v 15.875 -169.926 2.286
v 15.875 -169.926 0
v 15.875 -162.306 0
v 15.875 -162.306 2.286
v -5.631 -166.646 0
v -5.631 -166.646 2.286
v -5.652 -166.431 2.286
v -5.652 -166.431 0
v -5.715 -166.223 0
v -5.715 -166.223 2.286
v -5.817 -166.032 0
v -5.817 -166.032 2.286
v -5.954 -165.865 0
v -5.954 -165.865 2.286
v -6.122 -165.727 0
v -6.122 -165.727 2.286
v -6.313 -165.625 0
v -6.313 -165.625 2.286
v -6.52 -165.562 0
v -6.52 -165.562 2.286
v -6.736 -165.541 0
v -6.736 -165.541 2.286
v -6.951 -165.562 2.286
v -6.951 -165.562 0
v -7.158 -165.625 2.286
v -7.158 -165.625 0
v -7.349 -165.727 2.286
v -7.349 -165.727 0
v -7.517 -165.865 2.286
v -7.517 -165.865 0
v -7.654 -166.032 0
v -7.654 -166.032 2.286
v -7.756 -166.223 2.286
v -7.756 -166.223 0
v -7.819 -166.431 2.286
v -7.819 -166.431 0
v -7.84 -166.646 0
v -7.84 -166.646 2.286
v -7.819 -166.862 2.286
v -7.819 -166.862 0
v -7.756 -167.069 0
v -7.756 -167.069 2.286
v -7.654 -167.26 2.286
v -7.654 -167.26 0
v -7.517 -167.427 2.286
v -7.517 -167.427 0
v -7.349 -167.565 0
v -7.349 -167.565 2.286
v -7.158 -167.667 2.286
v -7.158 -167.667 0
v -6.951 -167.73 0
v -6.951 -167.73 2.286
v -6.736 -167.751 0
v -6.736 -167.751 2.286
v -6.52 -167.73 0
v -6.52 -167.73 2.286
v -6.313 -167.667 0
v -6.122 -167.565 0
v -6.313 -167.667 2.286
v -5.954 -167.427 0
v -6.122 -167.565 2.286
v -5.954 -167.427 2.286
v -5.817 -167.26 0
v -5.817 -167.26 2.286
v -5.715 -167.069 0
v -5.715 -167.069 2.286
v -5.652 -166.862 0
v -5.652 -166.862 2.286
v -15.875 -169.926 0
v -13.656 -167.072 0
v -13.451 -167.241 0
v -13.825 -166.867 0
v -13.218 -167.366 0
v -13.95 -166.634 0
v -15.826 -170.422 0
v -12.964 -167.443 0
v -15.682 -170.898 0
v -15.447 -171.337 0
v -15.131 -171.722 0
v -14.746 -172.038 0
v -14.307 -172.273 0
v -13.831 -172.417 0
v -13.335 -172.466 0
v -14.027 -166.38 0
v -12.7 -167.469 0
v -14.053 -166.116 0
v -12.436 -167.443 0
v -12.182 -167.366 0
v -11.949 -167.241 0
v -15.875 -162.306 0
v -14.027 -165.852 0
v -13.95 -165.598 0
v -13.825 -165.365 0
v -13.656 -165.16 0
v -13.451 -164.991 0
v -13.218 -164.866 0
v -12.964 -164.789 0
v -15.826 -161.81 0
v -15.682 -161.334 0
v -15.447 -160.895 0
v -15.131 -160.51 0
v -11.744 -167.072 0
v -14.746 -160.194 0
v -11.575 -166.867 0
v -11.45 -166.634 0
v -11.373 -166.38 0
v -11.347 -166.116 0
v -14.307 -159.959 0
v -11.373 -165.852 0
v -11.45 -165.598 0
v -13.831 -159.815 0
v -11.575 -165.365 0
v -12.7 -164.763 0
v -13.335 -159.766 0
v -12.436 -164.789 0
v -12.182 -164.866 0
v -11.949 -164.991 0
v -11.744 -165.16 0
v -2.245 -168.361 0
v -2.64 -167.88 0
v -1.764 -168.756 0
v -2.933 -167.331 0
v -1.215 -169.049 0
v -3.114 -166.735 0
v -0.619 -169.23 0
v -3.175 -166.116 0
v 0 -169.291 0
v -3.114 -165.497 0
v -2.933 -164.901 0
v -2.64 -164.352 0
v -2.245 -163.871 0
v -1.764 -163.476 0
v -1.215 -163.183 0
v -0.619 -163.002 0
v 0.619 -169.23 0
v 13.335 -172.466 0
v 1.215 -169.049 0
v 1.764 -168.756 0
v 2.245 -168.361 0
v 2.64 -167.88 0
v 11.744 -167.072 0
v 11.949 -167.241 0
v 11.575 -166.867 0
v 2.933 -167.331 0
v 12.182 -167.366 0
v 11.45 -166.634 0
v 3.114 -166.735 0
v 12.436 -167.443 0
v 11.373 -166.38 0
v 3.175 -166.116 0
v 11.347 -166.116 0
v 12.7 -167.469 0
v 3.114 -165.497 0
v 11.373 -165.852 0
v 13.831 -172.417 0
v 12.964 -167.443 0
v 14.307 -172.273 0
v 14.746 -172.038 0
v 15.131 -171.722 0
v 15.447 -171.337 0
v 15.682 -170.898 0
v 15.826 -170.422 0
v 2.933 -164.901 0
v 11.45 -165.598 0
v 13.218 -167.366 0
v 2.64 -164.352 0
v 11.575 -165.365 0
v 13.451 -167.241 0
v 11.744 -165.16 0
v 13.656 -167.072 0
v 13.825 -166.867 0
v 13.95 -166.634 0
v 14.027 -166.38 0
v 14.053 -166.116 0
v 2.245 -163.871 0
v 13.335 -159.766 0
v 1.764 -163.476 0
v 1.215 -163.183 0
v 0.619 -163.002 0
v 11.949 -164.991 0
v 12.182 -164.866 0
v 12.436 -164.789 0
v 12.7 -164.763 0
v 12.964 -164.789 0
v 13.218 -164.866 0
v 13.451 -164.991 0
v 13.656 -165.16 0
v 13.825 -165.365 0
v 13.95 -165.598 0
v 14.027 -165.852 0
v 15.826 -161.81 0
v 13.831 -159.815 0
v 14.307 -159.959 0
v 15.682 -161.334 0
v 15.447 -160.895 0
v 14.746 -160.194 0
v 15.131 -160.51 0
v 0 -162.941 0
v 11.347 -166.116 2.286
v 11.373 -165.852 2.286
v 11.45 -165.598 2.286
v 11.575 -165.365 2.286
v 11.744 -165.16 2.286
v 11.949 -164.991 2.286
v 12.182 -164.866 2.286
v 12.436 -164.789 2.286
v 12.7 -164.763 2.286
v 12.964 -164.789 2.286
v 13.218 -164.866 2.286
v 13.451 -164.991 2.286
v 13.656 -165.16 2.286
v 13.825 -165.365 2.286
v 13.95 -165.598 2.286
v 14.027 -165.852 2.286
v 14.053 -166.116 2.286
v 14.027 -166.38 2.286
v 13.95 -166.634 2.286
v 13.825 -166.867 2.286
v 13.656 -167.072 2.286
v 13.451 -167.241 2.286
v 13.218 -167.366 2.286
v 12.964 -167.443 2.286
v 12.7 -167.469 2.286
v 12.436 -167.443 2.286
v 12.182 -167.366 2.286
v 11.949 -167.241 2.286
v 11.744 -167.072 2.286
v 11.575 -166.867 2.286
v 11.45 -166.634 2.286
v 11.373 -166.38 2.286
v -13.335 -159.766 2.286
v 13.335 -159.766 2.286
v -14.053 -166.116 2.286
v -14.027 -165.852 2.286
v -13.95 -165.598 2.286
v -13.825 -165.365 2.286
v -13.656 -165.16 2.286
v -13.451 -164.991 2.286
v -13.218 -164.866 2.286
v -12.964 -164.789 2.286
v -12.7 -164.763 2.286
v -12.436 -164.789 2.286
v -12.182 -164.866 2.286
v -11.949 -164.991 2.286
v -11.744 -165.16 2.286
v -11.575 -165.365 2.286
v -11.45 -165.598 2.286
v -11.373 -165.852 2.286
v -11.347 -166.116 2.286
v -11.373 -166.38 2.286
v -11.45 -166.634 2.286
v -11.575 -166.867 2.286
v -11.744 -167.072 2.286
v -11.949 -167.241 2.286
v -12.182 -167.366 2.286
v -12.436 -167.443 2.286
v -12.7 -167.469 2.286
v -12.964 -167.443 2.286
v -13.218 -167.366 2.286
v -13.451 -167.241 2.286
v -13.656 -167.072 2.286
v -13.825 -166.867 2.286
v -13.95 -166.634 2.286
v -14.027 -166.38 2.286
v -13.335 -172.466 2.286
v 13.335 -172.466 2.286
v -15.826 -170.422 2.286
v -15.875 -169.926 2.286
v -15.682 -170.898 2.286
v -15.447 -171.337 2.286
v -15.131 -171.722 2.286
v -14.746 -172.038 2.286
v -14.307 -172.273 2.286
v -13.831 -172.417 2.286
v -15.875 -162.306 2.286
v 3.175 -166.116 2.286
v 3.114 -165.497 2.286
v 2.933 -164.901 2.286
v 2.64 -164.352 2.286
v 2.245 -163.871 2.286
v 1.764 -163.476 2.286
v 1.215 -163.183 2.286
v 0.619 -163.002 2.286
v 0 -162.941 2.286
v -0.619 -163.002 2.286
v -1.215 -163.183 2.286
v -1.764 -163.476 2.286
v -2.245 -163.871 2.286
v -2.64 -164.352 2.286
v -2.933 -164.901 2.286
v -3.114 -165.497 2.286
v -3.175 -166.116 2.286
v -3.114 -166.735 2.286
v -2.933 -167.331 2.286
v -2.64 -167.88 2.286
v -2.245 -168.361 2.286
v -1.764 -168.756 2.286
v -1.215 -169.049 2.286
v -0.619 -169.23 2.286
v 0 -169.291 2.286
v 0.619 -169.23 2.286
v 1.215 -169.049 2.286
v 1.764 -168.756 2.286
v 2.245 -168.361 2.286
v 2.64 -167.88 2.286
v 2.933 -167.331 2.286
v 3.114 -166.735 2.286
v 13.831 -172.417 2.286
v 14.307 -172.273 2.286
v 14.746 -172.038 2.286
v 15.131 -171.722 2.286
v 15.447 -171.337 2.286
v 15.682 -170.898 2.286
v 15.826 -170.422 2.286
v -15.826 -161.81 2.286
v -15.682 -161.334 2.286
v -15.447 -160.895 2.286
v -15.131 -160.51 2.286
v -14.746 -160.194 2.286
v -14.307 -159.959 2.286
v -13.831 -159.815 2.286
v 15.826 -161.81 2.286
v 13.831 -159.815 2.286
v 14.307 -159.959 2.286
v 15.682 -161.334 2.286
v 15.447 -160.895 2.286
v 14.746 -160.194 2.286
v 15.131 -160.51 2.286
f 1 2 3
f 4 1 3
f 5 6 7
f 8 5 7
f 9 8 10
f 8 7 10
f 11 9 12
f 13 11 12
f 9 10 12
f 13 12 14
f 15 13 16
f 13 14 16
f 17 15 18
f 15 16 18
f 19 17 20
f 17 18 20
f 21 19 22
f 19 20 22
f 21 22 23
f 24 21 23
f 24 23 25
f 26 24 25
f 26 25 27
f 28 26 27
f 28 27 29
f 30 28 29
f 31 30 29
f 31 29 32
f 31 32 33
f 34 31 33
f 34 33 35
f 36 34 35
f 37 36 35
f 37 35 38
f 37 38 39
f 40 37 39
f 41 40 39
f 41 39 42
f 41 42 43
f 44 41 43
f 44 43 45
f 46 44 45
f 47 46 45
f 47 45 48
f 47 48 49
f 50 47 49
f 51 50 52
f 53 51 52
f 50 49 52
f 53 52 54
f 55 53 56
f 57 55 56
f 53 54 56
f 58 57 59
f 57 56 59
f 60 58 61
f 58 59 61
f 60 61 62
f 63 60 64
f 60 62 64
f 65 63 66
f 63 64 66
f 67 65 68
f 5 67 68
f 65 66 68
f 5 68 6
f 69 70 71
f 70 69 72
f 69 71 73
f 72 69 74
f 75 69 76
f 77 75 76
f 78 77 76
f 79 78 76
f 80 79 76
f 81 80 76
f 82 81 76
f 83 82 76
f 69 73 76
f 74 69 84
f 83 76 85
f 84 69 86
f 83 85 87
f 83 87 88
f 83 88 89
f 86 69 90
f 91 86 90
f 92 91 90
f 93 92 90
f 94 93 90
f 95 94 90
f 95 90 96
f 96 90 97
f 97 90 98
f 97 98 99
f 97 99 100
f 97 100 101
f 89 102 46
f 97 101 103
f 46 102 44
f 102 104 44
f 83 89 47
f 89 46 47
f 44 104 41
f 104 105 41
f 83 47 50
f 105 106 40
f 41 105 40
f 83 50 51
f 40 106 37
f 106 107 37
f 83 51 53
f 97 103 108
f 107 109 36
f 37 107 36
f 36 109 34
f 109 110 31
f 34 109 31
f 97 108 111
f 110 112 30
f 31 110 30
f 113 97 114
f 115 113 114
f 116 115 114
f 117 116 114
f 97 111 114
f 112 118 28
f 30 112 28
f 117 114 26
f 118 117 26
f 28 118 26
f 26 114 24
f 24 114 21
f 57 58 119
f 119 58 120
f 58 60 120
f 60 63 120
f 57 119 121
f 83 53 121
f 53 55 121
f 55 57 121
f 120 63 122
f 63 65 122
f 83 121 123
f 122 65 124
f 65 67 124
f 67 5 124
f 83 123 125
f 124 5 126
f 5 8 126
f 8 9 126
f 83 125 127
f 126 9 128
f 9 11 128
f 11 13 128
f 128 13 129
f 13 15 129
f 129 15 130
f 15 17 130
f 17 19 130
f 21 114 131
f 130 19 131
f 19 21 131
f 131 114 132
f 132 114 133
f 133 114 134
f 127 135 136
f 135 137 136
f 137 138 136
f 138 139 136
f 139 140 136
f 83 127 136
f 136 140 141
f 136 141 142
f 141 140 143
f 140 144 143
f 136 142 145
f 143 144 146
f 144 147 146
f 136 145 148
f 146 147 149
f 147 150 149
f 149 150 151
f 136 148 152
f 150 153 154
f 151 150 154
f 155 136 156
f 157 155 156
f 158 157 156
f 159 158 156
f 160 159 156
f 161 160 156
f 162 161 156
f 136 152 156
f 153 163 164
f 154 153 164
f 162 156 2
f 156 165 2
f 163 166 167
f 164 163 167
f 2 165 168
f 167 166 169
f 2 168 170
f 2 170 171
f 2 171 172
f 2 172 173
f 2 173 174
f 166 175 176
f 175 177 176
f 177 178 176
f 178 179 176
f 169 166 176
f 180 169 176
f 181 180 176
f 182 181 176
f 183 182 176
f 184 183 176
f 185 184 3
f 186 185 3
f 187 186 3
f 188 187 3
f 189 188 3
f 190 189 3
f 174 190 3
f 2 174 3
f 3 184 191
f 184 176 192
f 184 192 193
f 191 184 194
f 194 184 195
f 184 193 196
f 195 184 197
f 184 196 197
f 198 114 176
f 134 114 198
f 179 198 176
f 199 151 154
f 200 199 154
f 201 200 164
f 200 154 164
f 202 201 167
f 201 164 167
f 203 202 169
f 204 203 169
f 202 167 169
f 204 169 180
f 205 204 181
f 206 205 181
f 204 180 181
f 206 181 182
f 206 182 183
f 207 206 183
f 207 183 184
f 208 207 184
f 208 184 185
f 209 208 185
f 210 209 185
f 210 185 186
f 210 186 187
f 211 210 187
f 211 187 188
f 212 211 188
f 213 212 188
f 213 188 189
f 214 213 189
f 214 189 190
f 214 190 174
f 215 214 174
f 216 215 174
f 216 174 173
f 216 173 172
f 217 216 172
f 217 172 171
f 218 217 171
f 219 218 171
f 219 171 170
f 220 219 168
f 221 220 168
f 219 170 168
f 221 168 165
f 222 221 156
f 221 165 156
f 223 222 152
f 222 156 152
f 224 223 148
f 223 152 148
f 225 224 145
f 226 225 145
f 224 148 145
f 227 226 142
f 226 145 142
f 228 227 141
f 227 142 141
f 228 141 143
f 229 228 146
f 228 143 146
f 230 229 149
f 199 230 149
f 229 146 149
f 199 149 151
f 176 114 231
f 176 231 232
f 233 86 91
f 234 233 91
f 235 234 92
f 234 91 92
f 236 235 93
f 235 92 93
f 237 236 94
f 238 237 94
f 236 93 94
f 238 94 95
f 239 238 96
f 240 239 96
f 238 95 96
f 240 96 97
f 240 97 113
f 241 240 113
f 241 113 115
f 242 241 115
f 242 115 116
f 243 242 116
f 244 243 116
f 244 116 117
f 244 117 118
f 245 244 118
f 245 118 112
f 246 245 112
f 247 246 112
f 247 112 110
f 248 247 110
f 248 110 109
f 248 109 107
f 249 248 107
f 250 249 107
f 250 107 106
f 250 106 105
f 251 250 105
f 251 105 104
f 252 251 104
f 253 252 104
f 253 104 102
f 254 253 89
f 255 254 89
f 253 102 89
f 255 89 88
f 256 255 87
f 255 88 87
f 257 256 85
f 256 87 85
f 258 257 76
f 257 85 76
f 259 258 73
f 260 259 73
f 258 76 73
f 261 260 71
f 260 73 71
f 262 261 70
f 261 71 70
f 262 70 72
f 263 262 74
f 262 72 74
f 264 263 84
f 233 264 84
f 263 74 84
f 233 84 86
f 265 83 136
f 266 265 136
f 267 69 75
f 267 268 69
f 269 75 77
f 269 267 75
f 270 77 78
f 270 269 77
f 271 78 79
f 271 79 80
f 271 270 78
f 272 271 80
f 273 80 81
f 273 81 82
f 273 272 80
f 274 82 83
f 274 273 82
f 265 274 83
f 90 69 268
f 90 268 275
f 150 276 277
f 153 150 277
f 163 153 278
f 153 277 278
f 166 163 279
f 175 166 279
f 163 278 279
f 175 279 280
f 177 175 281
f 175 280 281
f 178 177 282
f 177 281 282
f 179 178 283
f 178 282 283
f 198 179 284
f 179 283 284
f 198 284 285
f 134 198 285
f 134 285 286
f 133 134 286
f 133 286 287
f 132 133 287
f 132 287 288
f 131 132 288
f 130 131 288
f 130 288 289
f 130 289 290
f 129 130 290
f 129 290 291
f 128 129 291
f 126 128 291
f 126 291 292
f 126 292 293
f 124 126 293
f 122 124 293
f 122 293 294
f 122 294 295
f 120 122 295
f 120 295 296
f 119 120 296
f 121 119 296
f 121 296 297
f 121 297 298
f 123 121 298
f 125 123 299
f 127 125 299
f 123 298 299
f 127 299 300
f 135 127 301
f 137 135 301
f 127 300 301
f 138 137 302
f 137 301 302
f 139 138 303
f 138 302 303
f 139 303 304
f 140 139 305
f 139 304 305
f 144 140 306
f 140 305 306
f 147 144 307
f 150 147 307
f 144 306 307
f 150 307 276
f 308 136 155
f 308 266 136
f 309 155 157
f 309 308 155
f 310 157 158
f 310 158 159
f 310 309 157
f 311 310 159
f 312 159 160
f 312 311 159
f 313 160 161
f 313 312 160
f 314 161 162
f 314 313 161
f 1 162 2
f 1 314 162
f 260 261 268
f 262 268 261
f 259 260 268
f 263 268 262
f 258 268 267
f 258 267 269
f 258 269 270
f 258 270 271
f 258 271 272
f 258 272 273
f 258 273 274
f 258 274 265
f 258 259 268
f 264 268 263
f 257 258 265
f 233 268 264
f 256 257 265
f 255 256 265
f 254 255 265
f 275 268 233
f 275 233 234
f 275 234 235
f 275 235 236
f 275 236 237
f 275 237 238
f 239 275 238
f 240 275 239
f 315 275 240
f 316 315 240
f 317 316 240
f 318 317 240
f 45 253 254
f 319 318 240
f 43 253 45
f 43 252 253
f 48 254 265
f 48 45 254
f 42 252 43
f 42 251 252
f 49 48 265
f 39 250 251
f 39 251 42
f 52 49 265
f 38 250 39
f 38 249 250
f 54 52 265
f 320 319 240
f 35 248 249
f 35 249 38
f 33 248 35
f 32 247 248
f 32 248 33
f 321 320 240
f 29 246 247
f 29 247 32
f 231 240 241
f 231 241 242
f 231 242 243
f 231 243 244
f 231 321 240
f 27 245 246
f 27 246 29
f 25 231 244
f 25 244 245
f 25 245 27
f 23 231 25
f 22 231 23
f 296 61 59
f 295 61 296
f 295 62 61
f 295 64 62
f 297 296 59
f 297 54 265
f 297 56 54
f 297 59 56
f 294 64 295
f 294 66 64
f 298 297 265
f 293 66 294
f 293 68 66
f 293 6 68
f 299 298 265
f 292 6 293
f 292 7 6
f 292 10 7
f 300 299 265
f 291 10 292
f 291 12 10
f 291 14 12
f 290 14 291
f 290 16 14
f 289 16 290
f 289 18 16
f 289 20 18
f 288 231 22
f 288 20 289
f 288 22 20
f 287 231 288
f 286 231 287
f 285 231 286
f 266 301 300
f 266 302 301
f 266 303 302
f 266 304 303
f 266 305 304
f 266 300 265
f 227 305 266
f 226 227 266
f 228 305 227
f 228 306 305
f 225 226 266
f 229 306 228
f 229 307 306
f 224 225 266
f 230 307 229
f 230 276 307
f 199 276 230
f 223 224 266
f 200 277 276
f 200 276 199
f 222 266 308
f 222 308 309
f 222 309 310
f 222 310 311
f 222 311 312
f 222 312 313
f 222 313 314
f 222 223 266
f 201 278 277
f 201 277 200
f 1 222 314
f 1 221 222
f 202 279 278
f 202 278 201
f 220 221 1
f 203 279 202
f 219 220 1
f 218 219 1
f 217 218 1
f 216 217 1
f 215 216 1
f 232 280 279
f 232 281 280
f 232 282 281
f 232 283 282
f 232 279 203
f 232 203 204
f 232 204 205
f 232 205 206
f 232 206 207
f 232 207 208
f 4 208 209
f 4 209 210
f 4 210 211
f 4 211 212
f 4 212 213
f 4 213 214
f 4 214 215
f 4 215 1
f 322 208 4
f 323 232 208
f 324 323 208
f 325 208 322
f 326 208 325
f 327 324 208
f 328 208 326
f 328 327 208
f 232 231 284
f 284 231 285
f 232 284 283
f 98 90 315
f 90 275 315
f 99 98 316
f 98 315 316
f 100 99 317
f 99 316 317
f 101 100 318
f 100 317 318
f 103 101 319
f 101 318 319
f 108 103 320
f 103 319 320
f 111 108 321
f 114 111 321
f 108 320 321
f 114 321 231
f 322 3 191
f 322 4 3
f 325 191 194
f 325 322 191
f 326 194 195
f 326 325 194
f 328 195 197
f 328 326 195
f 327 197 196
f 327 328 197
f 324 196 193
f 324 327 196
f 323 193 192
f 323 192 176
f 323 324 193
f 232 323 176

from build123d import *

# Parameters (mm, degrees)
SKETCH1_W             = 31.75
SKETCH1_H             = 12.7
BOSS_EXTRUDE1_DEPTH   = 2.286
FILLET1_R             = 2.54
SKETCH2_R             = 3.175
SKETCH2_R_2           = 1.1049
CUT_EXTRUDE1_DEPTH    = 3.286
F_2_CLEARANCE_HOLE1_D = 2.7051


with BuildPart() as part:
    # Sketch1 → Boss-Extrude1 (new body)
    with BuildSketch(Plane.XY):
        with Locations((-1.87e-07, -166.116000205)):
            Rectangle(SKETCH1_W, SKETCH1_H)
    extrude(amount=BOSS_EXTRUDE1_DEPTH)

    # Fillet1
    fillet1_edges = [part.edges().sort_by_distance(p)[0] for p in [
        (15.874999813, -172.466000205, 1.143),
        (-15.875000187, -172.466000205, 1.143),
        (-15.875000187, -159.766000205, 1.143),
        (15.874999813, -159.766000205, 1.143),
    ]]
    fillet(fillet1_edges, radius=FILLET1_R)

    # Sketch2 → Cut-Extrude1 (cut, through all)
    with BuildSketch(Plane.XY.offset(2.286)):
        with Locations((-1.87e-07, -166.116000205)):
            Circle(SKETCH2_R)
        with Locations((-6.735572471, -166.64610111)):
            Circle(SKETCH2_R_2)
    extrude(amount=-CUT_EXTRUDE1_DEPTH, mode=Mode.SUBTRACT)

    # #2 Clearance Hole1 (through all)
    with Locations(Plane.XY.offset(2.286)):
        with Locations((12.699999906, -166.116000205), (-12.700000094, -166.116000205)):
            Hole(F_2_CLEARANCE_HOLE1_D / 2)


solid = part.part
